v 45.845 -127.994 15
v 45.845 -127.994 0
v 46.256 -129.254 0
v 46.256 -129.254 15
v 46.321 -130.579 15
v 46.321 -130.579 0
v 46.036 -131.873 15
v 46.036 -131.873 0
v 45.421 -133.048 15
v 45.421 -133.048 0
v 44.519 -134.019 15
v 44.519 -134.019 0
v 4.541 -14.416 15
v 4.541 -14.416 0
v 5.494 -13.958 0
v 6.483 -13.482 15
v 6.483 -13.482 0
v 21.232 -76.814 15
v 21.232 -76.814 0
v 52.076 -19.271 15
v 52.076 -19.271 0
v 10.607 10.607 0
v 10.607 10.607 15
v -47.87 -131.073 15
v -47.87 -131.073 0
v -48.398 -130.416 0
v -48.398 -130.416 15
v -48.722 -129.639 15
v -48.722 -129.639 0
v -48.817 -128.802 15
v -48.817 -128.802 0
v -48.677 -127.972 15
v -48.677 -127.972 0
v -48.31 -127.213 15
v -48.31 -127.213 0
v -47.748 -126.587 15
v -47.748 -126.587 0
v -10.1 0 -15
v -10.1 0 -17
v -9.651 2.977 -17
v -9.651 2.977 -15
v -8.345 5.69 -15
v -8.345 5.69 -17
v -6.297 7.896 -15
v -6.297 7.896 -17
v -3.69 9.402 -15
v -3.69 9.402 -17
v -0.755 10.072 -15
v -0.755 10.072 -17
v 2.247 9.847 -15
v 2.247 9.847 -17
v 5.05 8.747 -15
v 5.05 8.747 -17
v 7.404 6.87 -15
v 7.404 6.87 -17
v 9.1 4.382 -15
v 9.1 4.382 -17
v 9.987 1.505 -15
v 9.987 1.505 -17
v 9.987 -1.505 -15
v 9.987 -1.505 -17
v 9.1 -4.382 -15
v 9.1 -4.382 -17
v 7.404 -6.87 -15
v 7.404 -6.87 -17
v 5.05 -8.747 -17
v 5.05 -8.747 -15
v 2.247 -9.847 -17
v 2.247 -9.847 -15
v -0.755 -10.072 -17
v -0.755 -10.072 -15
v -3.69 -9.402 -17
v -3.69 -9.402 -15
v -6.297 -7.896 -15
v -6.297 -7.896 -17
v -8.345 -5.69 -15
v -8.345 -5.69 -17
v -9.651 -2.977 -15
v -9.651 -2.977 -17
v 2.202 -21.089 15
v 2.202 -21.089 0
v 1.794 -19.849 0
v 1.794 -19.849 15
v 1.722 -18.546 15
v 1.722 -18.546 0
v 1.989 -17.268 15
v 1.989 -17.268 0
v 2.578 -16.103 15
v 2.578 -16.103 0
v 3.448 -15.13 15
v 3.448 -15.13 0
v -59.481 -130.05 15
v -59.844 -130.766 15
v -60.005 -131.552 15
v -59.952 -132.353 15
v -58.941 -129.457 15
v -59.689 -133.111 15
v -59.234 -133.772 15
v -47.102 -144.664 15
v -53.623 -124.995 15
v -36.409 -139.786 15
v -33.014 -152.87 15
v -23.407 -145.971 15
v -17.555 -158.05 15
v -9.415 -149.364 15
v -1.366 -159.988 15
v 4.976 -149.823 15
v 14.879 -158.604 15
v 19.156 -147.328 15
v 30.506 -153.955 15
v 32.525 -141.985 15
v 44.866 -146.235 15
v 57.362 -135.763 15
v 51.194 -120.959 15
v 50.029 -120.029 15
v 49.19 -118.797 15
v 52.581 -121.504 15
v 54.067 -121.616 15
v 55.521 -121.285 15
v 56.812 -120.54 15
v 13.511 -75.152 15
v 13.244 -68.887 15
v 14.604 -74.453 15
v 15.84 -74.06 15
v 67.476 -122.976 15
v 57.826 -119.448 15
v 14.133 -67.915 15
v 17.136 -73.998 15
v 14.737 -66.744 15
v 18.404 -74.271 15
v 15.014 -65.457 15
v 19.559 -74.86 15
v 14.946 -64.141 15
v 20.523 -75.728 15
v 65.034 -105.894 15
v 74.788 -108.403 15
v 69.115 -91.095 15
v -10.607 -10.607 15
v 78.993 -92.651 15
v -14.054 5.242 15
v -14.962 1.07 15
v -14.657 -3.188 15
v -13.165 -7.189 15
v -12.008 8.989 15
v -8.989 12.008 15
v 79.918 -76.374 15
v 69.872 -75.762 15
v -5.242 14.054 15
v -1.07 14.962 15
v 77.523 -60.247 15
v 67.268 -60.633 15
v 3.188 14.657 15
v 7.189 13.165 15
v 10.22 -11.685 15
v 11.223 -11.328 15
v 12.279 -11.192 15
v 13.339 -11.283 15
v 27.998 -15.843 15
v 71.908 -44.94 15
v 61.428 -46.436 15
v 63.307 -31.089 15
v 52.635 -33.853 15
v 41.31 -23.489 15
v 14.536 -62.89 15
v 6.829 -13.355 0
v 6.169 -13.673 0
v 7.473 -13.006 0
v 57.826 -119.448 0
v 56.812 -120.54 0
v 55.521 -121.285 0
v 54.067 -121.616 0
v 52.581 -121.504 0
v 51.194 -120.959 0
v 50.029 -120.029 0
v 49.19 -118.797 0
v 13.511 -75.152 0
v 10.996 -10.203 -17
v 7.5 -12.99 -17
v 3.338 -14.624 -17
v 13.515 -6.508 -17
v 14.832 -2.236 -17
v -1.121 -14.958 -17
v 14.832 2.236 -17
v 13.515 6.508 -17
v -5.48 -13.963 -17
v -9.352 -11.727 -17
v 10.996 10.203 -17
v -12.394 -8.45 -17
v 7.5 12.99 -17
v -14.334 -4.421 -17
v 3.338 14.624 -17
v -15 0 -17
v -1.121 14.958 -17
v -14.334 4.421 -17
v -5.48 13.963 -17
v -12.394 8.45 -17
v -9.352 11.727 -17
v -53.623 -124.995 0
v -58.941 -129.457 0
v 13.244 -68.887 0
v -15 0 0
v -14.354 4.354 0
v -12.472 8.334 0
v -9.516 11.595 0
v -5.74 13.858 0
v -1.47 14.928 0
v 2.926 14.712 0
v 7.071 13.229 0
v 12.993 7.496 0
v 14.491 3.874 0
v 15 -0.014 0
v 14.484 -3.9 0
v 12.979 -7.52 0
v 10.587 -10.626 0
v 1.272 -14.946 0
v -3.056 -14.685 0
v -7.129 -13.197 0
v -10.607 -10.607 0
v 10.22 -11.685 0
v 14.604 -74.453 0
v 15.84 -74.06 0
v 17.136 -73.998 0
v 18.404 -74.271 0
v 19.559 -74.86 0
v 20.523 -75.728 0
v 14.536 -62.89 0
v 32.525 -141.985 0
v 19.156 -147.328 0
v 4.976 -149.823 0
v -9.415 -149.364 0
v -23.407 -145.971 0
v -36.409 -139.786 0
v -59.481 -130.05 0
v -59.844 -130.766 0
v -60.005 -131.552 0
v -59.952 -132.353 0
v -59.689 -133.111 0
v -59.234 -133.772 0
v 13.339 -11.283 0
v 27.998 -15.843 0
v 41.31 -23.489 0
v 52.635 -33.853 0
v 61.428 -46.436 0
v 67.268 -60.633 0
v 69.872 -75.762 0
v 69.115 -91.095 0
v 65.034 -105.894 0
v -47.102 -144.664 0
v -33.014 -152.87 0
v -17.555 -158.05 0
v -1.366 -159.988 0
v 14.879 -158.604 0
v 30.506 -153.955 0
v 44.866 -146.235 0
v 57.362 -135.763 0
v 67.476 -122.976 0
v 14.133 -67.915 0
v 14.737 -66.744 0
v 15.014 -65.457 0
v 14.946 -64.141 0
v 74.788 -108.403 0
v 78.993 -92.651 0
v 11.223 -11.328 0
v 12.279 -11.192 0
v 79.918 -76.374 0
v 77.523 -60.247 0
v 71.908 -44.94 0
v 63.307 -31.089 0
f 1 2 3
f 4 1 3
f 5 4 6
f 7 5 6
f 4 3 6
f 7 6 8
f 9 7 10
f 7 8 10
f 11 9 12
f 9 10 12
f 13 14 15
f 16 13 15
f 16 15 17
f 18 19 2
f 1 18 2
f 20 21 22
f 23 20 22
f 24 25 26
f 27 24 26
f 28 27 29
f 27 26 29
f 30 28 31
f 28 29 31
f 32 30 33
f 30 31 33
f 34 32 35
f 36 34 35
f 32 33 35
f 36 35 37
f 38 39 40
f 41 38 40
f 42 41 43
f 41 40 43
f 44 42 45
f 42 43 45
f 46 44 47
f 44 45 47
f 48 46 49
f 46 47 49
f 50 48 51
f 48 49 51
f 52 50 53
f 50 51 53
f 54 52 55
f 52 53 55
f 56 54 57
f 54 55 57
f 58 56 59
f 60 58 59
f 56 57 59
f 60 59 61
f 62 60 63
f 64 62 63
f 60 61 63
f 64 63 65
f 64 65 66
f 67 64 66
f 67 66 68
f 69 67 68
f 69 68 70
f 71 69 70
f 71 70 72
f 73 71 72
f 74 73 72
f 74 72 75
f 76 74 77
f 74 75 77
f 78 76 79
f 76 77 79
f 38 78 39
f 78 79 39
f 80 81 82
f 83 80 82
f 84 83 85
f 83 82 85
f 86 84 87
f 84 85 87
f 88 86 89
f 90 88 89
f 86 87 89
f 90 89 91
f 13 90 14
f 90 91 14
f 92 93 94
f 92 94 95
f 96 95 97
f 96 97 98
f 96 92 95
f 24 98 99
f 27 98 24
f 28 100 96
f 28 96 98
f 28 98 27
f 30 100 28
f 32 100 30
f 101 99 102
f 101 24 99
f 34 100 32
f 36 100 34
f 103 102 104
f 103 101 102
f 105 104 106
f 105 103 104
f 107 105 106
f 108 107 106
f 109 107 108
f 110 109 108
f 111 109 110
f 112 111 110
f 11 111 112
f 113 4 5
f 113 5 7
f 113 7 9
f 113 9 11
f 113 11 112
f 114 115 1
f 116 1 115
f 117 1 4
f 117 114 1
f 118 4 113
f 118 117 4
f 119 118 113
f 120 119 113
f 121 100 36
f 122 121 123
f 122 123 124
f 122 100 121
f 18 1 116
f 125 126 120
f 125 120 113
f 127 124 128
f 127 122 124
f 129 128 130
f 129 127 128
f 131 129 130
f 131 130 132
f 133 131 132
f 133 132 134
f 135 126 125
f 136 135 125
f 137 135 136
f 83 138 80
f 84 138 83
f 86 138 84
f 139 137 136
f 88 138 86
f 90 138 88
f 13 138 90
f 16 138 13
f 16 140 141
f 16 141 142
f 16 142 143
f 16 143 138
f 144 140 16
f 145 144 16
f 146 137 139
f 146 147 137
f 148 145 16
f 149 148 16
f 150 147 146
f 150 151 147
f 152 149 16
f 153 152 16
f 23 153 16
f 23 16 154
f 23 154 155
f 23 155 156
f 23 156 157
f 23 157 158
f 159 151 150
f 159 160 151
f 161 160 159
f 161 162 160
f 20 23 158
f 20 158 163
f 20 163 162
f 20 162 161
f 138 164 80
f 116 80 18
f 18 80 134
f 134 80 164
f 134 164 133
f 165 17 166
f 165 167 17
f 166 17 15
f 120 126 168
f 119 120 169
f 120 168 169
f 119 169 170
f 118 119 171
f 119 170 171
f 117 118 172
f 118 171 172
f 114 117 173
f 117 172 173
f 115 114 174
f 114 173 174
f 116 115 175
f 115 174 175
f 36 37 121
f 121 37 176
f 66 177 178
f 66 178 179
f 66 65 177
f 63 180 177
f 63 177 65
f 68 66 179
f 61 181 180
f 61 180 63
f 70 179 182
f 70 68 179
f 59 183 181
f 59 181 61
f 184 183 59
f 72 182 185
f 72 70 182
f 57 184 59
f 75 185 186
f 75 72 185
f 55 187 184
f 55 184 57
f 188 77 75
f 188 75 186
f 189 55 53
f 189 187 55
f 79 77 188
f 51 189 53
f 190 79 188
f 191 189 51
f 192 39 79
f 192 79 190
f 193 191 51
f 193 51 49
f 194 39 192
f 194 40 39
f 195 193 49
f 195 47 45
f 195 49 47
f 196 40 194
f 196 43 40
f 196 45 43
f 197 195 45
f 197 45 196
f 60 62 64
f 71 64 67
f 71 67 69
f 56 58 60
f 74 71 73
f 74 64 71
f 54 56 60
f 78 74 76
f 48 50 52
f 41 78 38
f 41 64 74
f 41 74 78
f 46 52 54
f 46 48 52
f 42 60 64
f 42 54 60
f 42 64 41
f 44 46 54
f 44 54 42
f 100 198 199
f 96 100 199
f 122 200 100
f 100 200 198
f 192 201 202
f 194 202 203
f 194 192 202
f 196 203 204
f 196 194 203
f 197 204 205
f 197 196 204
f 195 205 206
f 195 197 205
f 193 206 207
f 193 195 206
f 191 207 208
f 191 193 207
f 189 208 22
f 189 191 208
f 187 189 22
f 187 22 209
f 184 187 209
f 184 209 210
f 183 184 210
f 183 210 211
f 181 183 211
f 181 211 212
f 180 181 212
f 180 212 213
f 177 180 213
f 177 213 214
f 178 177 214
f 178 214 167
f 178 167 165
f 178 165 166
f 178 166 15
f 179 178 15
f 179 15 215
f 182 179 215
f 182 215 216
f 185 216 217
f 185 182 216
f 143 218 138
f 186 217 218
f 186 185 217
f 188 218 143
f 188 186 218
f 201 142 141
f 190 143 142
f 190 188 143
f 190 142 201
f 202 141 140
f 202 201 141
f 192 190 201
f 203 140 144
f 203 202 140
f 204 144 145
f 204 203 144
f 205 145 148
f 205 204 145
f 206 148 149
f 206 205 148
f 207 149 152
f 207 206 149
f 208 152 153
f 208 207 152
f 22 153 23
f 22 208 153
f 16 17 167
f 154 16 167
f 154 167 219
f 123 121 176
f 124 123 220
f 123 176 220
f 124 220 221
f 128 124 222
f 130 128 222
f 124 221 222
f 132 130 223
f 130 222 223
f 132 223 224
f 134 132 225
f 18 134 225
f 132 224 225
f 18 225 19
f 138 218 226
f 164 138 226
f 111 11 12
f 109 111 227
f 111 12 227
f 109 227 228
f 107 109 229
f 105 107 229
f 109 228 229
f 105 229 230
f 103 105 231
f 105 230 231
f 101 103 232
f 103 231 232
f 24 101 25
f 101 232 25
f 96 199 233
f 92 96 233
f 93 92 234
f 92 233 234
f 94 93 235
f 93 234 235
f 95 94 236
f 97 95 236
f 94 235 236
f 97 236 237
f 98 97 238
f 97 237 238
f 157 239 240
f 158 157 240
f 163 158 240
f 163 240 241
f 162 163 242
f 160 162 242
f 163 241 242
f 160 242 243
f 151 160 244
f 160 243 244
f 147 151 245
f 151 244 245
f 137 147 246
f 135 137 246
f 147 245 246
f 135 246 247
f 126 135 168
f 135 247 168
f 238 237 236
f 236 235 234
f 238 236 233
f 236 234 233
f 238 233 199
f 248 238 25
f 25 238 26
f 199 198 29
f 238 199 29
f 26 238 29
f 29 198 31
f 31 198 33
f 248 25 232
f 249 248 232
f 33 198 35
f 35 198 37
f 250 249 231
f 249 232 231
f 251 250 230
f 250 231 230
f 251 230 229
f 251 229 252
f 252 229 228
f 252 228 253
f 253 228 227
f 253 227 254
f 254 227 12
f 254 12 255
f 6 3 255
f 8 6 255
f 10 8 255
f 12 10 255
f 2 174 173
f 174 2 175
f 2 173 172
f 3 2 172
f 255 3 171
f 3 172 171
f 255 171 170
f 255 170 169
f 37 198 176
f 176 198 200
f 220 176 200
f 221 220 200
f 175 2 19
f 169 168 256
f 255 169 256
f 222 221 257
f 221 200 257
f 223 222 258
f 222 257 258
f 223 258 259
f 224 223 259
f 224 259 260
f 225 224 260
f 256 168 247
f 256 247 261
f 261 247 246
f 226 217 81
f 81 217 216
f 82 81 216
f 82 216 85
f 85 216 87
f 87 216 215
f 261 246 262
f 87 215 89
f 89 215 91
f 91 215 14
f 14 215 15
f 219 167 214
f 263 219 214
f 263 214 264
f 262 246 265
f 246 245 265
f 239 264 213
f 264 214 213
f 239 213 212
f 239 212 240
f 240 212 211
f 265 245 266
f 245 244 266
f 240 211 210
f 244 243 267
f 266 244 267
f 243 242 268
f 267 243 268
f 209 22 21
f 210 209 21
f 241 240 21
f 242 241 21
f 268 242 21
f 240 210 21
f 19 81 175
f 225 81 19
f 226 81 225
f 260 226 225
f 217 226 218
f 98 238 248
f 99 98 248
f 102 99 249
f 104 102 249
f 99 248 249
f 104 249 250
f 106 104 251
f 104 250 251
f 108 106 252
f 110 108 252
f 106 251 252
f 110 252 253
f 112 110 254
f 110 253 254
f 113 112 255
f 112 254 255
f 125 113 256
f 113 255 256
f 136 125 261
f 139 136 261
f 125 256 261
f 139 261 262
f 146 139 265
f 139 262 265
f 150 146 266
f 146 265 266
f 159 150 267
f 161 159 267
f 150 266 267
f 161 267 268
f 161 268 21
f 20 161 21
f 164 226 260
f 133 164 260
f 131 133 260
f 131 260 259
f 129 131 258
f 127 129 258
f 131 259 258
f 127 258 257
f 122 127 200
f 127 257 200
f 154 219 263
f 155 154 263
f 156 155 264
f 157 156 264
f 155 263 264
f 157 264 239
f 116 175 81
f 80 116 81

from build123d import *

# Parameters (mm, degrees)
EXTRUDE_1_DEPTH     = 15
CUT_EXTRUDE_START   = -15
CUT_EXTRUDE_1_DEPTH = 15
EXTRUDE_START       = 17
SKETCH_11_R         = 15
EXTRUDE_3_DEPTH     = 17
SKETCH_12_R         = 10.1
CUT_EXTRUDE_5_DEPTH = 2


with BuildPart() as part:
    # ｽｹｯﾁ4 → ﾎﾞｽ - 押し出し1 (new body)
    with BuildSketch(Plane.XY):
        with BuildLine():
            Line((-53.623111018, -124.995132678), (-58.940636287, -129.45706617))
            ThreePointArc((-58.940636287, -129.45706617), (-60.005384698, -131.552012131), (-59.233530865, -133.771635843))
            ThreePointArc((-59.233530865, -133.771635843), (57.362306223, -135.763481103), (52.076178918, -19.270504783))
            Line((52.076178918, -19.270504783), (10.606601718, 10.606601718))
            ThreePointArc((10.606601718, 10.606601718), (-10.606601718, 10.606601718), (-10.606601718, -10.606601718))
            Line((-10.606601718, -10.606601718), (14.536280154, -62.889638219))
            ThreePointArc((14.536280154, -62.889638219), (14.918089499, -66.109676181), (13.244185189, -68.886809092))
            Line((13.244185189, -68.886809092), (-53.623111018, -124.995132678))
        make_face()
        with BuildLine():
            Line((21.232400696, -76.813798404), (45.844843506, -127.993820346))
            ThreePointArc((45.844843506, -127.993820346), (46.221944165, -131.235480845), (44.518718993, -134.019289696))
            ThreePointArc((44.518718993, -134.019289696), (-2.231208213, -149.964431749), (-47.870174388, -131.072951785))
            ThreePointArc((-47.870174388, -131.072951785), (-48.817477846, -128.802229421), (-47.747678417, -126.586582094))
            Line((-47.747678417, -126.586582094), (13.511229465, -75.151532228))
            ThreePointArc((13.511229465, -75.151532228), (17.77869109, -74.092739753), (21.232400696, -76.813798404))
        make_face(mode=Mode.SUBTRACT)
    extrude(amount=EXTRUDE_1_DEPTH)

    # ｽｹｯﾁ6 → ｶｯﾄ - 押し出し1 (cut)
    with BuildSketch(Plane.XY.offset(15).offset(CUT_EXTRUDE_START)):
        with BuildLine():
            Line((49.189589797, -118.797265215), (2.201751786, -21.089020696))
            ThreePointArc((2.201751786, -21.089020696), (1.989274209, -17.268089629), (4.540836142, -14.416039025))
            Line((4.540836142, -14.416039025), (6.483415605, -13.48185369))
            Line((6.483415605, -13.48185369), (10.219658847, -11.685096486))
            ThreePointArc((10.219658847, -11.685096486), (11.747077013, -11.232198087), (13.339423466, -11.282754846))
            ThreePointArc((13.339423466, -11.282754846), (64.738421392, -53.37413296), (57.826055334, -119.448033215))
            ThreePointArc((57.826055334, -119.448033215), (53.319931874, -121.616182211), (49.189589797, -118.797265215))
        make_face()
    extrude(amount=CUT_EXTRUDE_1_DEPTH, mode=Mode.SUBTRACT)

    # ｽｹｯﾁ11 → ﾎﾞｽ - 押し出し3 (add)
    with BuildSketch(Plane(origin=(0, 0, 0), x_dir=(-1, 0, 0), z_dir=(0, 0, -1)).offset(EXTRUDE_START)):
        Circle(SKETCH_11_R)
    extrude(amount=-EXTRUDE_3_DEPTH)

    # ｽｹｯﾁ12 → ｶｯﾄ - 押し出し5 (cut)
    with BuildSketch(Plane(origin=(0, 0, -17), x_dir=(-1, 0, 0), z_dir=(0, 0, -1))):
        Circle(SKETCH_12_R)
    extrude(amount=-CUT_EXTRUDE_5_DEPTH, mode=Mode.SUBTRACT)


solid = part.part
